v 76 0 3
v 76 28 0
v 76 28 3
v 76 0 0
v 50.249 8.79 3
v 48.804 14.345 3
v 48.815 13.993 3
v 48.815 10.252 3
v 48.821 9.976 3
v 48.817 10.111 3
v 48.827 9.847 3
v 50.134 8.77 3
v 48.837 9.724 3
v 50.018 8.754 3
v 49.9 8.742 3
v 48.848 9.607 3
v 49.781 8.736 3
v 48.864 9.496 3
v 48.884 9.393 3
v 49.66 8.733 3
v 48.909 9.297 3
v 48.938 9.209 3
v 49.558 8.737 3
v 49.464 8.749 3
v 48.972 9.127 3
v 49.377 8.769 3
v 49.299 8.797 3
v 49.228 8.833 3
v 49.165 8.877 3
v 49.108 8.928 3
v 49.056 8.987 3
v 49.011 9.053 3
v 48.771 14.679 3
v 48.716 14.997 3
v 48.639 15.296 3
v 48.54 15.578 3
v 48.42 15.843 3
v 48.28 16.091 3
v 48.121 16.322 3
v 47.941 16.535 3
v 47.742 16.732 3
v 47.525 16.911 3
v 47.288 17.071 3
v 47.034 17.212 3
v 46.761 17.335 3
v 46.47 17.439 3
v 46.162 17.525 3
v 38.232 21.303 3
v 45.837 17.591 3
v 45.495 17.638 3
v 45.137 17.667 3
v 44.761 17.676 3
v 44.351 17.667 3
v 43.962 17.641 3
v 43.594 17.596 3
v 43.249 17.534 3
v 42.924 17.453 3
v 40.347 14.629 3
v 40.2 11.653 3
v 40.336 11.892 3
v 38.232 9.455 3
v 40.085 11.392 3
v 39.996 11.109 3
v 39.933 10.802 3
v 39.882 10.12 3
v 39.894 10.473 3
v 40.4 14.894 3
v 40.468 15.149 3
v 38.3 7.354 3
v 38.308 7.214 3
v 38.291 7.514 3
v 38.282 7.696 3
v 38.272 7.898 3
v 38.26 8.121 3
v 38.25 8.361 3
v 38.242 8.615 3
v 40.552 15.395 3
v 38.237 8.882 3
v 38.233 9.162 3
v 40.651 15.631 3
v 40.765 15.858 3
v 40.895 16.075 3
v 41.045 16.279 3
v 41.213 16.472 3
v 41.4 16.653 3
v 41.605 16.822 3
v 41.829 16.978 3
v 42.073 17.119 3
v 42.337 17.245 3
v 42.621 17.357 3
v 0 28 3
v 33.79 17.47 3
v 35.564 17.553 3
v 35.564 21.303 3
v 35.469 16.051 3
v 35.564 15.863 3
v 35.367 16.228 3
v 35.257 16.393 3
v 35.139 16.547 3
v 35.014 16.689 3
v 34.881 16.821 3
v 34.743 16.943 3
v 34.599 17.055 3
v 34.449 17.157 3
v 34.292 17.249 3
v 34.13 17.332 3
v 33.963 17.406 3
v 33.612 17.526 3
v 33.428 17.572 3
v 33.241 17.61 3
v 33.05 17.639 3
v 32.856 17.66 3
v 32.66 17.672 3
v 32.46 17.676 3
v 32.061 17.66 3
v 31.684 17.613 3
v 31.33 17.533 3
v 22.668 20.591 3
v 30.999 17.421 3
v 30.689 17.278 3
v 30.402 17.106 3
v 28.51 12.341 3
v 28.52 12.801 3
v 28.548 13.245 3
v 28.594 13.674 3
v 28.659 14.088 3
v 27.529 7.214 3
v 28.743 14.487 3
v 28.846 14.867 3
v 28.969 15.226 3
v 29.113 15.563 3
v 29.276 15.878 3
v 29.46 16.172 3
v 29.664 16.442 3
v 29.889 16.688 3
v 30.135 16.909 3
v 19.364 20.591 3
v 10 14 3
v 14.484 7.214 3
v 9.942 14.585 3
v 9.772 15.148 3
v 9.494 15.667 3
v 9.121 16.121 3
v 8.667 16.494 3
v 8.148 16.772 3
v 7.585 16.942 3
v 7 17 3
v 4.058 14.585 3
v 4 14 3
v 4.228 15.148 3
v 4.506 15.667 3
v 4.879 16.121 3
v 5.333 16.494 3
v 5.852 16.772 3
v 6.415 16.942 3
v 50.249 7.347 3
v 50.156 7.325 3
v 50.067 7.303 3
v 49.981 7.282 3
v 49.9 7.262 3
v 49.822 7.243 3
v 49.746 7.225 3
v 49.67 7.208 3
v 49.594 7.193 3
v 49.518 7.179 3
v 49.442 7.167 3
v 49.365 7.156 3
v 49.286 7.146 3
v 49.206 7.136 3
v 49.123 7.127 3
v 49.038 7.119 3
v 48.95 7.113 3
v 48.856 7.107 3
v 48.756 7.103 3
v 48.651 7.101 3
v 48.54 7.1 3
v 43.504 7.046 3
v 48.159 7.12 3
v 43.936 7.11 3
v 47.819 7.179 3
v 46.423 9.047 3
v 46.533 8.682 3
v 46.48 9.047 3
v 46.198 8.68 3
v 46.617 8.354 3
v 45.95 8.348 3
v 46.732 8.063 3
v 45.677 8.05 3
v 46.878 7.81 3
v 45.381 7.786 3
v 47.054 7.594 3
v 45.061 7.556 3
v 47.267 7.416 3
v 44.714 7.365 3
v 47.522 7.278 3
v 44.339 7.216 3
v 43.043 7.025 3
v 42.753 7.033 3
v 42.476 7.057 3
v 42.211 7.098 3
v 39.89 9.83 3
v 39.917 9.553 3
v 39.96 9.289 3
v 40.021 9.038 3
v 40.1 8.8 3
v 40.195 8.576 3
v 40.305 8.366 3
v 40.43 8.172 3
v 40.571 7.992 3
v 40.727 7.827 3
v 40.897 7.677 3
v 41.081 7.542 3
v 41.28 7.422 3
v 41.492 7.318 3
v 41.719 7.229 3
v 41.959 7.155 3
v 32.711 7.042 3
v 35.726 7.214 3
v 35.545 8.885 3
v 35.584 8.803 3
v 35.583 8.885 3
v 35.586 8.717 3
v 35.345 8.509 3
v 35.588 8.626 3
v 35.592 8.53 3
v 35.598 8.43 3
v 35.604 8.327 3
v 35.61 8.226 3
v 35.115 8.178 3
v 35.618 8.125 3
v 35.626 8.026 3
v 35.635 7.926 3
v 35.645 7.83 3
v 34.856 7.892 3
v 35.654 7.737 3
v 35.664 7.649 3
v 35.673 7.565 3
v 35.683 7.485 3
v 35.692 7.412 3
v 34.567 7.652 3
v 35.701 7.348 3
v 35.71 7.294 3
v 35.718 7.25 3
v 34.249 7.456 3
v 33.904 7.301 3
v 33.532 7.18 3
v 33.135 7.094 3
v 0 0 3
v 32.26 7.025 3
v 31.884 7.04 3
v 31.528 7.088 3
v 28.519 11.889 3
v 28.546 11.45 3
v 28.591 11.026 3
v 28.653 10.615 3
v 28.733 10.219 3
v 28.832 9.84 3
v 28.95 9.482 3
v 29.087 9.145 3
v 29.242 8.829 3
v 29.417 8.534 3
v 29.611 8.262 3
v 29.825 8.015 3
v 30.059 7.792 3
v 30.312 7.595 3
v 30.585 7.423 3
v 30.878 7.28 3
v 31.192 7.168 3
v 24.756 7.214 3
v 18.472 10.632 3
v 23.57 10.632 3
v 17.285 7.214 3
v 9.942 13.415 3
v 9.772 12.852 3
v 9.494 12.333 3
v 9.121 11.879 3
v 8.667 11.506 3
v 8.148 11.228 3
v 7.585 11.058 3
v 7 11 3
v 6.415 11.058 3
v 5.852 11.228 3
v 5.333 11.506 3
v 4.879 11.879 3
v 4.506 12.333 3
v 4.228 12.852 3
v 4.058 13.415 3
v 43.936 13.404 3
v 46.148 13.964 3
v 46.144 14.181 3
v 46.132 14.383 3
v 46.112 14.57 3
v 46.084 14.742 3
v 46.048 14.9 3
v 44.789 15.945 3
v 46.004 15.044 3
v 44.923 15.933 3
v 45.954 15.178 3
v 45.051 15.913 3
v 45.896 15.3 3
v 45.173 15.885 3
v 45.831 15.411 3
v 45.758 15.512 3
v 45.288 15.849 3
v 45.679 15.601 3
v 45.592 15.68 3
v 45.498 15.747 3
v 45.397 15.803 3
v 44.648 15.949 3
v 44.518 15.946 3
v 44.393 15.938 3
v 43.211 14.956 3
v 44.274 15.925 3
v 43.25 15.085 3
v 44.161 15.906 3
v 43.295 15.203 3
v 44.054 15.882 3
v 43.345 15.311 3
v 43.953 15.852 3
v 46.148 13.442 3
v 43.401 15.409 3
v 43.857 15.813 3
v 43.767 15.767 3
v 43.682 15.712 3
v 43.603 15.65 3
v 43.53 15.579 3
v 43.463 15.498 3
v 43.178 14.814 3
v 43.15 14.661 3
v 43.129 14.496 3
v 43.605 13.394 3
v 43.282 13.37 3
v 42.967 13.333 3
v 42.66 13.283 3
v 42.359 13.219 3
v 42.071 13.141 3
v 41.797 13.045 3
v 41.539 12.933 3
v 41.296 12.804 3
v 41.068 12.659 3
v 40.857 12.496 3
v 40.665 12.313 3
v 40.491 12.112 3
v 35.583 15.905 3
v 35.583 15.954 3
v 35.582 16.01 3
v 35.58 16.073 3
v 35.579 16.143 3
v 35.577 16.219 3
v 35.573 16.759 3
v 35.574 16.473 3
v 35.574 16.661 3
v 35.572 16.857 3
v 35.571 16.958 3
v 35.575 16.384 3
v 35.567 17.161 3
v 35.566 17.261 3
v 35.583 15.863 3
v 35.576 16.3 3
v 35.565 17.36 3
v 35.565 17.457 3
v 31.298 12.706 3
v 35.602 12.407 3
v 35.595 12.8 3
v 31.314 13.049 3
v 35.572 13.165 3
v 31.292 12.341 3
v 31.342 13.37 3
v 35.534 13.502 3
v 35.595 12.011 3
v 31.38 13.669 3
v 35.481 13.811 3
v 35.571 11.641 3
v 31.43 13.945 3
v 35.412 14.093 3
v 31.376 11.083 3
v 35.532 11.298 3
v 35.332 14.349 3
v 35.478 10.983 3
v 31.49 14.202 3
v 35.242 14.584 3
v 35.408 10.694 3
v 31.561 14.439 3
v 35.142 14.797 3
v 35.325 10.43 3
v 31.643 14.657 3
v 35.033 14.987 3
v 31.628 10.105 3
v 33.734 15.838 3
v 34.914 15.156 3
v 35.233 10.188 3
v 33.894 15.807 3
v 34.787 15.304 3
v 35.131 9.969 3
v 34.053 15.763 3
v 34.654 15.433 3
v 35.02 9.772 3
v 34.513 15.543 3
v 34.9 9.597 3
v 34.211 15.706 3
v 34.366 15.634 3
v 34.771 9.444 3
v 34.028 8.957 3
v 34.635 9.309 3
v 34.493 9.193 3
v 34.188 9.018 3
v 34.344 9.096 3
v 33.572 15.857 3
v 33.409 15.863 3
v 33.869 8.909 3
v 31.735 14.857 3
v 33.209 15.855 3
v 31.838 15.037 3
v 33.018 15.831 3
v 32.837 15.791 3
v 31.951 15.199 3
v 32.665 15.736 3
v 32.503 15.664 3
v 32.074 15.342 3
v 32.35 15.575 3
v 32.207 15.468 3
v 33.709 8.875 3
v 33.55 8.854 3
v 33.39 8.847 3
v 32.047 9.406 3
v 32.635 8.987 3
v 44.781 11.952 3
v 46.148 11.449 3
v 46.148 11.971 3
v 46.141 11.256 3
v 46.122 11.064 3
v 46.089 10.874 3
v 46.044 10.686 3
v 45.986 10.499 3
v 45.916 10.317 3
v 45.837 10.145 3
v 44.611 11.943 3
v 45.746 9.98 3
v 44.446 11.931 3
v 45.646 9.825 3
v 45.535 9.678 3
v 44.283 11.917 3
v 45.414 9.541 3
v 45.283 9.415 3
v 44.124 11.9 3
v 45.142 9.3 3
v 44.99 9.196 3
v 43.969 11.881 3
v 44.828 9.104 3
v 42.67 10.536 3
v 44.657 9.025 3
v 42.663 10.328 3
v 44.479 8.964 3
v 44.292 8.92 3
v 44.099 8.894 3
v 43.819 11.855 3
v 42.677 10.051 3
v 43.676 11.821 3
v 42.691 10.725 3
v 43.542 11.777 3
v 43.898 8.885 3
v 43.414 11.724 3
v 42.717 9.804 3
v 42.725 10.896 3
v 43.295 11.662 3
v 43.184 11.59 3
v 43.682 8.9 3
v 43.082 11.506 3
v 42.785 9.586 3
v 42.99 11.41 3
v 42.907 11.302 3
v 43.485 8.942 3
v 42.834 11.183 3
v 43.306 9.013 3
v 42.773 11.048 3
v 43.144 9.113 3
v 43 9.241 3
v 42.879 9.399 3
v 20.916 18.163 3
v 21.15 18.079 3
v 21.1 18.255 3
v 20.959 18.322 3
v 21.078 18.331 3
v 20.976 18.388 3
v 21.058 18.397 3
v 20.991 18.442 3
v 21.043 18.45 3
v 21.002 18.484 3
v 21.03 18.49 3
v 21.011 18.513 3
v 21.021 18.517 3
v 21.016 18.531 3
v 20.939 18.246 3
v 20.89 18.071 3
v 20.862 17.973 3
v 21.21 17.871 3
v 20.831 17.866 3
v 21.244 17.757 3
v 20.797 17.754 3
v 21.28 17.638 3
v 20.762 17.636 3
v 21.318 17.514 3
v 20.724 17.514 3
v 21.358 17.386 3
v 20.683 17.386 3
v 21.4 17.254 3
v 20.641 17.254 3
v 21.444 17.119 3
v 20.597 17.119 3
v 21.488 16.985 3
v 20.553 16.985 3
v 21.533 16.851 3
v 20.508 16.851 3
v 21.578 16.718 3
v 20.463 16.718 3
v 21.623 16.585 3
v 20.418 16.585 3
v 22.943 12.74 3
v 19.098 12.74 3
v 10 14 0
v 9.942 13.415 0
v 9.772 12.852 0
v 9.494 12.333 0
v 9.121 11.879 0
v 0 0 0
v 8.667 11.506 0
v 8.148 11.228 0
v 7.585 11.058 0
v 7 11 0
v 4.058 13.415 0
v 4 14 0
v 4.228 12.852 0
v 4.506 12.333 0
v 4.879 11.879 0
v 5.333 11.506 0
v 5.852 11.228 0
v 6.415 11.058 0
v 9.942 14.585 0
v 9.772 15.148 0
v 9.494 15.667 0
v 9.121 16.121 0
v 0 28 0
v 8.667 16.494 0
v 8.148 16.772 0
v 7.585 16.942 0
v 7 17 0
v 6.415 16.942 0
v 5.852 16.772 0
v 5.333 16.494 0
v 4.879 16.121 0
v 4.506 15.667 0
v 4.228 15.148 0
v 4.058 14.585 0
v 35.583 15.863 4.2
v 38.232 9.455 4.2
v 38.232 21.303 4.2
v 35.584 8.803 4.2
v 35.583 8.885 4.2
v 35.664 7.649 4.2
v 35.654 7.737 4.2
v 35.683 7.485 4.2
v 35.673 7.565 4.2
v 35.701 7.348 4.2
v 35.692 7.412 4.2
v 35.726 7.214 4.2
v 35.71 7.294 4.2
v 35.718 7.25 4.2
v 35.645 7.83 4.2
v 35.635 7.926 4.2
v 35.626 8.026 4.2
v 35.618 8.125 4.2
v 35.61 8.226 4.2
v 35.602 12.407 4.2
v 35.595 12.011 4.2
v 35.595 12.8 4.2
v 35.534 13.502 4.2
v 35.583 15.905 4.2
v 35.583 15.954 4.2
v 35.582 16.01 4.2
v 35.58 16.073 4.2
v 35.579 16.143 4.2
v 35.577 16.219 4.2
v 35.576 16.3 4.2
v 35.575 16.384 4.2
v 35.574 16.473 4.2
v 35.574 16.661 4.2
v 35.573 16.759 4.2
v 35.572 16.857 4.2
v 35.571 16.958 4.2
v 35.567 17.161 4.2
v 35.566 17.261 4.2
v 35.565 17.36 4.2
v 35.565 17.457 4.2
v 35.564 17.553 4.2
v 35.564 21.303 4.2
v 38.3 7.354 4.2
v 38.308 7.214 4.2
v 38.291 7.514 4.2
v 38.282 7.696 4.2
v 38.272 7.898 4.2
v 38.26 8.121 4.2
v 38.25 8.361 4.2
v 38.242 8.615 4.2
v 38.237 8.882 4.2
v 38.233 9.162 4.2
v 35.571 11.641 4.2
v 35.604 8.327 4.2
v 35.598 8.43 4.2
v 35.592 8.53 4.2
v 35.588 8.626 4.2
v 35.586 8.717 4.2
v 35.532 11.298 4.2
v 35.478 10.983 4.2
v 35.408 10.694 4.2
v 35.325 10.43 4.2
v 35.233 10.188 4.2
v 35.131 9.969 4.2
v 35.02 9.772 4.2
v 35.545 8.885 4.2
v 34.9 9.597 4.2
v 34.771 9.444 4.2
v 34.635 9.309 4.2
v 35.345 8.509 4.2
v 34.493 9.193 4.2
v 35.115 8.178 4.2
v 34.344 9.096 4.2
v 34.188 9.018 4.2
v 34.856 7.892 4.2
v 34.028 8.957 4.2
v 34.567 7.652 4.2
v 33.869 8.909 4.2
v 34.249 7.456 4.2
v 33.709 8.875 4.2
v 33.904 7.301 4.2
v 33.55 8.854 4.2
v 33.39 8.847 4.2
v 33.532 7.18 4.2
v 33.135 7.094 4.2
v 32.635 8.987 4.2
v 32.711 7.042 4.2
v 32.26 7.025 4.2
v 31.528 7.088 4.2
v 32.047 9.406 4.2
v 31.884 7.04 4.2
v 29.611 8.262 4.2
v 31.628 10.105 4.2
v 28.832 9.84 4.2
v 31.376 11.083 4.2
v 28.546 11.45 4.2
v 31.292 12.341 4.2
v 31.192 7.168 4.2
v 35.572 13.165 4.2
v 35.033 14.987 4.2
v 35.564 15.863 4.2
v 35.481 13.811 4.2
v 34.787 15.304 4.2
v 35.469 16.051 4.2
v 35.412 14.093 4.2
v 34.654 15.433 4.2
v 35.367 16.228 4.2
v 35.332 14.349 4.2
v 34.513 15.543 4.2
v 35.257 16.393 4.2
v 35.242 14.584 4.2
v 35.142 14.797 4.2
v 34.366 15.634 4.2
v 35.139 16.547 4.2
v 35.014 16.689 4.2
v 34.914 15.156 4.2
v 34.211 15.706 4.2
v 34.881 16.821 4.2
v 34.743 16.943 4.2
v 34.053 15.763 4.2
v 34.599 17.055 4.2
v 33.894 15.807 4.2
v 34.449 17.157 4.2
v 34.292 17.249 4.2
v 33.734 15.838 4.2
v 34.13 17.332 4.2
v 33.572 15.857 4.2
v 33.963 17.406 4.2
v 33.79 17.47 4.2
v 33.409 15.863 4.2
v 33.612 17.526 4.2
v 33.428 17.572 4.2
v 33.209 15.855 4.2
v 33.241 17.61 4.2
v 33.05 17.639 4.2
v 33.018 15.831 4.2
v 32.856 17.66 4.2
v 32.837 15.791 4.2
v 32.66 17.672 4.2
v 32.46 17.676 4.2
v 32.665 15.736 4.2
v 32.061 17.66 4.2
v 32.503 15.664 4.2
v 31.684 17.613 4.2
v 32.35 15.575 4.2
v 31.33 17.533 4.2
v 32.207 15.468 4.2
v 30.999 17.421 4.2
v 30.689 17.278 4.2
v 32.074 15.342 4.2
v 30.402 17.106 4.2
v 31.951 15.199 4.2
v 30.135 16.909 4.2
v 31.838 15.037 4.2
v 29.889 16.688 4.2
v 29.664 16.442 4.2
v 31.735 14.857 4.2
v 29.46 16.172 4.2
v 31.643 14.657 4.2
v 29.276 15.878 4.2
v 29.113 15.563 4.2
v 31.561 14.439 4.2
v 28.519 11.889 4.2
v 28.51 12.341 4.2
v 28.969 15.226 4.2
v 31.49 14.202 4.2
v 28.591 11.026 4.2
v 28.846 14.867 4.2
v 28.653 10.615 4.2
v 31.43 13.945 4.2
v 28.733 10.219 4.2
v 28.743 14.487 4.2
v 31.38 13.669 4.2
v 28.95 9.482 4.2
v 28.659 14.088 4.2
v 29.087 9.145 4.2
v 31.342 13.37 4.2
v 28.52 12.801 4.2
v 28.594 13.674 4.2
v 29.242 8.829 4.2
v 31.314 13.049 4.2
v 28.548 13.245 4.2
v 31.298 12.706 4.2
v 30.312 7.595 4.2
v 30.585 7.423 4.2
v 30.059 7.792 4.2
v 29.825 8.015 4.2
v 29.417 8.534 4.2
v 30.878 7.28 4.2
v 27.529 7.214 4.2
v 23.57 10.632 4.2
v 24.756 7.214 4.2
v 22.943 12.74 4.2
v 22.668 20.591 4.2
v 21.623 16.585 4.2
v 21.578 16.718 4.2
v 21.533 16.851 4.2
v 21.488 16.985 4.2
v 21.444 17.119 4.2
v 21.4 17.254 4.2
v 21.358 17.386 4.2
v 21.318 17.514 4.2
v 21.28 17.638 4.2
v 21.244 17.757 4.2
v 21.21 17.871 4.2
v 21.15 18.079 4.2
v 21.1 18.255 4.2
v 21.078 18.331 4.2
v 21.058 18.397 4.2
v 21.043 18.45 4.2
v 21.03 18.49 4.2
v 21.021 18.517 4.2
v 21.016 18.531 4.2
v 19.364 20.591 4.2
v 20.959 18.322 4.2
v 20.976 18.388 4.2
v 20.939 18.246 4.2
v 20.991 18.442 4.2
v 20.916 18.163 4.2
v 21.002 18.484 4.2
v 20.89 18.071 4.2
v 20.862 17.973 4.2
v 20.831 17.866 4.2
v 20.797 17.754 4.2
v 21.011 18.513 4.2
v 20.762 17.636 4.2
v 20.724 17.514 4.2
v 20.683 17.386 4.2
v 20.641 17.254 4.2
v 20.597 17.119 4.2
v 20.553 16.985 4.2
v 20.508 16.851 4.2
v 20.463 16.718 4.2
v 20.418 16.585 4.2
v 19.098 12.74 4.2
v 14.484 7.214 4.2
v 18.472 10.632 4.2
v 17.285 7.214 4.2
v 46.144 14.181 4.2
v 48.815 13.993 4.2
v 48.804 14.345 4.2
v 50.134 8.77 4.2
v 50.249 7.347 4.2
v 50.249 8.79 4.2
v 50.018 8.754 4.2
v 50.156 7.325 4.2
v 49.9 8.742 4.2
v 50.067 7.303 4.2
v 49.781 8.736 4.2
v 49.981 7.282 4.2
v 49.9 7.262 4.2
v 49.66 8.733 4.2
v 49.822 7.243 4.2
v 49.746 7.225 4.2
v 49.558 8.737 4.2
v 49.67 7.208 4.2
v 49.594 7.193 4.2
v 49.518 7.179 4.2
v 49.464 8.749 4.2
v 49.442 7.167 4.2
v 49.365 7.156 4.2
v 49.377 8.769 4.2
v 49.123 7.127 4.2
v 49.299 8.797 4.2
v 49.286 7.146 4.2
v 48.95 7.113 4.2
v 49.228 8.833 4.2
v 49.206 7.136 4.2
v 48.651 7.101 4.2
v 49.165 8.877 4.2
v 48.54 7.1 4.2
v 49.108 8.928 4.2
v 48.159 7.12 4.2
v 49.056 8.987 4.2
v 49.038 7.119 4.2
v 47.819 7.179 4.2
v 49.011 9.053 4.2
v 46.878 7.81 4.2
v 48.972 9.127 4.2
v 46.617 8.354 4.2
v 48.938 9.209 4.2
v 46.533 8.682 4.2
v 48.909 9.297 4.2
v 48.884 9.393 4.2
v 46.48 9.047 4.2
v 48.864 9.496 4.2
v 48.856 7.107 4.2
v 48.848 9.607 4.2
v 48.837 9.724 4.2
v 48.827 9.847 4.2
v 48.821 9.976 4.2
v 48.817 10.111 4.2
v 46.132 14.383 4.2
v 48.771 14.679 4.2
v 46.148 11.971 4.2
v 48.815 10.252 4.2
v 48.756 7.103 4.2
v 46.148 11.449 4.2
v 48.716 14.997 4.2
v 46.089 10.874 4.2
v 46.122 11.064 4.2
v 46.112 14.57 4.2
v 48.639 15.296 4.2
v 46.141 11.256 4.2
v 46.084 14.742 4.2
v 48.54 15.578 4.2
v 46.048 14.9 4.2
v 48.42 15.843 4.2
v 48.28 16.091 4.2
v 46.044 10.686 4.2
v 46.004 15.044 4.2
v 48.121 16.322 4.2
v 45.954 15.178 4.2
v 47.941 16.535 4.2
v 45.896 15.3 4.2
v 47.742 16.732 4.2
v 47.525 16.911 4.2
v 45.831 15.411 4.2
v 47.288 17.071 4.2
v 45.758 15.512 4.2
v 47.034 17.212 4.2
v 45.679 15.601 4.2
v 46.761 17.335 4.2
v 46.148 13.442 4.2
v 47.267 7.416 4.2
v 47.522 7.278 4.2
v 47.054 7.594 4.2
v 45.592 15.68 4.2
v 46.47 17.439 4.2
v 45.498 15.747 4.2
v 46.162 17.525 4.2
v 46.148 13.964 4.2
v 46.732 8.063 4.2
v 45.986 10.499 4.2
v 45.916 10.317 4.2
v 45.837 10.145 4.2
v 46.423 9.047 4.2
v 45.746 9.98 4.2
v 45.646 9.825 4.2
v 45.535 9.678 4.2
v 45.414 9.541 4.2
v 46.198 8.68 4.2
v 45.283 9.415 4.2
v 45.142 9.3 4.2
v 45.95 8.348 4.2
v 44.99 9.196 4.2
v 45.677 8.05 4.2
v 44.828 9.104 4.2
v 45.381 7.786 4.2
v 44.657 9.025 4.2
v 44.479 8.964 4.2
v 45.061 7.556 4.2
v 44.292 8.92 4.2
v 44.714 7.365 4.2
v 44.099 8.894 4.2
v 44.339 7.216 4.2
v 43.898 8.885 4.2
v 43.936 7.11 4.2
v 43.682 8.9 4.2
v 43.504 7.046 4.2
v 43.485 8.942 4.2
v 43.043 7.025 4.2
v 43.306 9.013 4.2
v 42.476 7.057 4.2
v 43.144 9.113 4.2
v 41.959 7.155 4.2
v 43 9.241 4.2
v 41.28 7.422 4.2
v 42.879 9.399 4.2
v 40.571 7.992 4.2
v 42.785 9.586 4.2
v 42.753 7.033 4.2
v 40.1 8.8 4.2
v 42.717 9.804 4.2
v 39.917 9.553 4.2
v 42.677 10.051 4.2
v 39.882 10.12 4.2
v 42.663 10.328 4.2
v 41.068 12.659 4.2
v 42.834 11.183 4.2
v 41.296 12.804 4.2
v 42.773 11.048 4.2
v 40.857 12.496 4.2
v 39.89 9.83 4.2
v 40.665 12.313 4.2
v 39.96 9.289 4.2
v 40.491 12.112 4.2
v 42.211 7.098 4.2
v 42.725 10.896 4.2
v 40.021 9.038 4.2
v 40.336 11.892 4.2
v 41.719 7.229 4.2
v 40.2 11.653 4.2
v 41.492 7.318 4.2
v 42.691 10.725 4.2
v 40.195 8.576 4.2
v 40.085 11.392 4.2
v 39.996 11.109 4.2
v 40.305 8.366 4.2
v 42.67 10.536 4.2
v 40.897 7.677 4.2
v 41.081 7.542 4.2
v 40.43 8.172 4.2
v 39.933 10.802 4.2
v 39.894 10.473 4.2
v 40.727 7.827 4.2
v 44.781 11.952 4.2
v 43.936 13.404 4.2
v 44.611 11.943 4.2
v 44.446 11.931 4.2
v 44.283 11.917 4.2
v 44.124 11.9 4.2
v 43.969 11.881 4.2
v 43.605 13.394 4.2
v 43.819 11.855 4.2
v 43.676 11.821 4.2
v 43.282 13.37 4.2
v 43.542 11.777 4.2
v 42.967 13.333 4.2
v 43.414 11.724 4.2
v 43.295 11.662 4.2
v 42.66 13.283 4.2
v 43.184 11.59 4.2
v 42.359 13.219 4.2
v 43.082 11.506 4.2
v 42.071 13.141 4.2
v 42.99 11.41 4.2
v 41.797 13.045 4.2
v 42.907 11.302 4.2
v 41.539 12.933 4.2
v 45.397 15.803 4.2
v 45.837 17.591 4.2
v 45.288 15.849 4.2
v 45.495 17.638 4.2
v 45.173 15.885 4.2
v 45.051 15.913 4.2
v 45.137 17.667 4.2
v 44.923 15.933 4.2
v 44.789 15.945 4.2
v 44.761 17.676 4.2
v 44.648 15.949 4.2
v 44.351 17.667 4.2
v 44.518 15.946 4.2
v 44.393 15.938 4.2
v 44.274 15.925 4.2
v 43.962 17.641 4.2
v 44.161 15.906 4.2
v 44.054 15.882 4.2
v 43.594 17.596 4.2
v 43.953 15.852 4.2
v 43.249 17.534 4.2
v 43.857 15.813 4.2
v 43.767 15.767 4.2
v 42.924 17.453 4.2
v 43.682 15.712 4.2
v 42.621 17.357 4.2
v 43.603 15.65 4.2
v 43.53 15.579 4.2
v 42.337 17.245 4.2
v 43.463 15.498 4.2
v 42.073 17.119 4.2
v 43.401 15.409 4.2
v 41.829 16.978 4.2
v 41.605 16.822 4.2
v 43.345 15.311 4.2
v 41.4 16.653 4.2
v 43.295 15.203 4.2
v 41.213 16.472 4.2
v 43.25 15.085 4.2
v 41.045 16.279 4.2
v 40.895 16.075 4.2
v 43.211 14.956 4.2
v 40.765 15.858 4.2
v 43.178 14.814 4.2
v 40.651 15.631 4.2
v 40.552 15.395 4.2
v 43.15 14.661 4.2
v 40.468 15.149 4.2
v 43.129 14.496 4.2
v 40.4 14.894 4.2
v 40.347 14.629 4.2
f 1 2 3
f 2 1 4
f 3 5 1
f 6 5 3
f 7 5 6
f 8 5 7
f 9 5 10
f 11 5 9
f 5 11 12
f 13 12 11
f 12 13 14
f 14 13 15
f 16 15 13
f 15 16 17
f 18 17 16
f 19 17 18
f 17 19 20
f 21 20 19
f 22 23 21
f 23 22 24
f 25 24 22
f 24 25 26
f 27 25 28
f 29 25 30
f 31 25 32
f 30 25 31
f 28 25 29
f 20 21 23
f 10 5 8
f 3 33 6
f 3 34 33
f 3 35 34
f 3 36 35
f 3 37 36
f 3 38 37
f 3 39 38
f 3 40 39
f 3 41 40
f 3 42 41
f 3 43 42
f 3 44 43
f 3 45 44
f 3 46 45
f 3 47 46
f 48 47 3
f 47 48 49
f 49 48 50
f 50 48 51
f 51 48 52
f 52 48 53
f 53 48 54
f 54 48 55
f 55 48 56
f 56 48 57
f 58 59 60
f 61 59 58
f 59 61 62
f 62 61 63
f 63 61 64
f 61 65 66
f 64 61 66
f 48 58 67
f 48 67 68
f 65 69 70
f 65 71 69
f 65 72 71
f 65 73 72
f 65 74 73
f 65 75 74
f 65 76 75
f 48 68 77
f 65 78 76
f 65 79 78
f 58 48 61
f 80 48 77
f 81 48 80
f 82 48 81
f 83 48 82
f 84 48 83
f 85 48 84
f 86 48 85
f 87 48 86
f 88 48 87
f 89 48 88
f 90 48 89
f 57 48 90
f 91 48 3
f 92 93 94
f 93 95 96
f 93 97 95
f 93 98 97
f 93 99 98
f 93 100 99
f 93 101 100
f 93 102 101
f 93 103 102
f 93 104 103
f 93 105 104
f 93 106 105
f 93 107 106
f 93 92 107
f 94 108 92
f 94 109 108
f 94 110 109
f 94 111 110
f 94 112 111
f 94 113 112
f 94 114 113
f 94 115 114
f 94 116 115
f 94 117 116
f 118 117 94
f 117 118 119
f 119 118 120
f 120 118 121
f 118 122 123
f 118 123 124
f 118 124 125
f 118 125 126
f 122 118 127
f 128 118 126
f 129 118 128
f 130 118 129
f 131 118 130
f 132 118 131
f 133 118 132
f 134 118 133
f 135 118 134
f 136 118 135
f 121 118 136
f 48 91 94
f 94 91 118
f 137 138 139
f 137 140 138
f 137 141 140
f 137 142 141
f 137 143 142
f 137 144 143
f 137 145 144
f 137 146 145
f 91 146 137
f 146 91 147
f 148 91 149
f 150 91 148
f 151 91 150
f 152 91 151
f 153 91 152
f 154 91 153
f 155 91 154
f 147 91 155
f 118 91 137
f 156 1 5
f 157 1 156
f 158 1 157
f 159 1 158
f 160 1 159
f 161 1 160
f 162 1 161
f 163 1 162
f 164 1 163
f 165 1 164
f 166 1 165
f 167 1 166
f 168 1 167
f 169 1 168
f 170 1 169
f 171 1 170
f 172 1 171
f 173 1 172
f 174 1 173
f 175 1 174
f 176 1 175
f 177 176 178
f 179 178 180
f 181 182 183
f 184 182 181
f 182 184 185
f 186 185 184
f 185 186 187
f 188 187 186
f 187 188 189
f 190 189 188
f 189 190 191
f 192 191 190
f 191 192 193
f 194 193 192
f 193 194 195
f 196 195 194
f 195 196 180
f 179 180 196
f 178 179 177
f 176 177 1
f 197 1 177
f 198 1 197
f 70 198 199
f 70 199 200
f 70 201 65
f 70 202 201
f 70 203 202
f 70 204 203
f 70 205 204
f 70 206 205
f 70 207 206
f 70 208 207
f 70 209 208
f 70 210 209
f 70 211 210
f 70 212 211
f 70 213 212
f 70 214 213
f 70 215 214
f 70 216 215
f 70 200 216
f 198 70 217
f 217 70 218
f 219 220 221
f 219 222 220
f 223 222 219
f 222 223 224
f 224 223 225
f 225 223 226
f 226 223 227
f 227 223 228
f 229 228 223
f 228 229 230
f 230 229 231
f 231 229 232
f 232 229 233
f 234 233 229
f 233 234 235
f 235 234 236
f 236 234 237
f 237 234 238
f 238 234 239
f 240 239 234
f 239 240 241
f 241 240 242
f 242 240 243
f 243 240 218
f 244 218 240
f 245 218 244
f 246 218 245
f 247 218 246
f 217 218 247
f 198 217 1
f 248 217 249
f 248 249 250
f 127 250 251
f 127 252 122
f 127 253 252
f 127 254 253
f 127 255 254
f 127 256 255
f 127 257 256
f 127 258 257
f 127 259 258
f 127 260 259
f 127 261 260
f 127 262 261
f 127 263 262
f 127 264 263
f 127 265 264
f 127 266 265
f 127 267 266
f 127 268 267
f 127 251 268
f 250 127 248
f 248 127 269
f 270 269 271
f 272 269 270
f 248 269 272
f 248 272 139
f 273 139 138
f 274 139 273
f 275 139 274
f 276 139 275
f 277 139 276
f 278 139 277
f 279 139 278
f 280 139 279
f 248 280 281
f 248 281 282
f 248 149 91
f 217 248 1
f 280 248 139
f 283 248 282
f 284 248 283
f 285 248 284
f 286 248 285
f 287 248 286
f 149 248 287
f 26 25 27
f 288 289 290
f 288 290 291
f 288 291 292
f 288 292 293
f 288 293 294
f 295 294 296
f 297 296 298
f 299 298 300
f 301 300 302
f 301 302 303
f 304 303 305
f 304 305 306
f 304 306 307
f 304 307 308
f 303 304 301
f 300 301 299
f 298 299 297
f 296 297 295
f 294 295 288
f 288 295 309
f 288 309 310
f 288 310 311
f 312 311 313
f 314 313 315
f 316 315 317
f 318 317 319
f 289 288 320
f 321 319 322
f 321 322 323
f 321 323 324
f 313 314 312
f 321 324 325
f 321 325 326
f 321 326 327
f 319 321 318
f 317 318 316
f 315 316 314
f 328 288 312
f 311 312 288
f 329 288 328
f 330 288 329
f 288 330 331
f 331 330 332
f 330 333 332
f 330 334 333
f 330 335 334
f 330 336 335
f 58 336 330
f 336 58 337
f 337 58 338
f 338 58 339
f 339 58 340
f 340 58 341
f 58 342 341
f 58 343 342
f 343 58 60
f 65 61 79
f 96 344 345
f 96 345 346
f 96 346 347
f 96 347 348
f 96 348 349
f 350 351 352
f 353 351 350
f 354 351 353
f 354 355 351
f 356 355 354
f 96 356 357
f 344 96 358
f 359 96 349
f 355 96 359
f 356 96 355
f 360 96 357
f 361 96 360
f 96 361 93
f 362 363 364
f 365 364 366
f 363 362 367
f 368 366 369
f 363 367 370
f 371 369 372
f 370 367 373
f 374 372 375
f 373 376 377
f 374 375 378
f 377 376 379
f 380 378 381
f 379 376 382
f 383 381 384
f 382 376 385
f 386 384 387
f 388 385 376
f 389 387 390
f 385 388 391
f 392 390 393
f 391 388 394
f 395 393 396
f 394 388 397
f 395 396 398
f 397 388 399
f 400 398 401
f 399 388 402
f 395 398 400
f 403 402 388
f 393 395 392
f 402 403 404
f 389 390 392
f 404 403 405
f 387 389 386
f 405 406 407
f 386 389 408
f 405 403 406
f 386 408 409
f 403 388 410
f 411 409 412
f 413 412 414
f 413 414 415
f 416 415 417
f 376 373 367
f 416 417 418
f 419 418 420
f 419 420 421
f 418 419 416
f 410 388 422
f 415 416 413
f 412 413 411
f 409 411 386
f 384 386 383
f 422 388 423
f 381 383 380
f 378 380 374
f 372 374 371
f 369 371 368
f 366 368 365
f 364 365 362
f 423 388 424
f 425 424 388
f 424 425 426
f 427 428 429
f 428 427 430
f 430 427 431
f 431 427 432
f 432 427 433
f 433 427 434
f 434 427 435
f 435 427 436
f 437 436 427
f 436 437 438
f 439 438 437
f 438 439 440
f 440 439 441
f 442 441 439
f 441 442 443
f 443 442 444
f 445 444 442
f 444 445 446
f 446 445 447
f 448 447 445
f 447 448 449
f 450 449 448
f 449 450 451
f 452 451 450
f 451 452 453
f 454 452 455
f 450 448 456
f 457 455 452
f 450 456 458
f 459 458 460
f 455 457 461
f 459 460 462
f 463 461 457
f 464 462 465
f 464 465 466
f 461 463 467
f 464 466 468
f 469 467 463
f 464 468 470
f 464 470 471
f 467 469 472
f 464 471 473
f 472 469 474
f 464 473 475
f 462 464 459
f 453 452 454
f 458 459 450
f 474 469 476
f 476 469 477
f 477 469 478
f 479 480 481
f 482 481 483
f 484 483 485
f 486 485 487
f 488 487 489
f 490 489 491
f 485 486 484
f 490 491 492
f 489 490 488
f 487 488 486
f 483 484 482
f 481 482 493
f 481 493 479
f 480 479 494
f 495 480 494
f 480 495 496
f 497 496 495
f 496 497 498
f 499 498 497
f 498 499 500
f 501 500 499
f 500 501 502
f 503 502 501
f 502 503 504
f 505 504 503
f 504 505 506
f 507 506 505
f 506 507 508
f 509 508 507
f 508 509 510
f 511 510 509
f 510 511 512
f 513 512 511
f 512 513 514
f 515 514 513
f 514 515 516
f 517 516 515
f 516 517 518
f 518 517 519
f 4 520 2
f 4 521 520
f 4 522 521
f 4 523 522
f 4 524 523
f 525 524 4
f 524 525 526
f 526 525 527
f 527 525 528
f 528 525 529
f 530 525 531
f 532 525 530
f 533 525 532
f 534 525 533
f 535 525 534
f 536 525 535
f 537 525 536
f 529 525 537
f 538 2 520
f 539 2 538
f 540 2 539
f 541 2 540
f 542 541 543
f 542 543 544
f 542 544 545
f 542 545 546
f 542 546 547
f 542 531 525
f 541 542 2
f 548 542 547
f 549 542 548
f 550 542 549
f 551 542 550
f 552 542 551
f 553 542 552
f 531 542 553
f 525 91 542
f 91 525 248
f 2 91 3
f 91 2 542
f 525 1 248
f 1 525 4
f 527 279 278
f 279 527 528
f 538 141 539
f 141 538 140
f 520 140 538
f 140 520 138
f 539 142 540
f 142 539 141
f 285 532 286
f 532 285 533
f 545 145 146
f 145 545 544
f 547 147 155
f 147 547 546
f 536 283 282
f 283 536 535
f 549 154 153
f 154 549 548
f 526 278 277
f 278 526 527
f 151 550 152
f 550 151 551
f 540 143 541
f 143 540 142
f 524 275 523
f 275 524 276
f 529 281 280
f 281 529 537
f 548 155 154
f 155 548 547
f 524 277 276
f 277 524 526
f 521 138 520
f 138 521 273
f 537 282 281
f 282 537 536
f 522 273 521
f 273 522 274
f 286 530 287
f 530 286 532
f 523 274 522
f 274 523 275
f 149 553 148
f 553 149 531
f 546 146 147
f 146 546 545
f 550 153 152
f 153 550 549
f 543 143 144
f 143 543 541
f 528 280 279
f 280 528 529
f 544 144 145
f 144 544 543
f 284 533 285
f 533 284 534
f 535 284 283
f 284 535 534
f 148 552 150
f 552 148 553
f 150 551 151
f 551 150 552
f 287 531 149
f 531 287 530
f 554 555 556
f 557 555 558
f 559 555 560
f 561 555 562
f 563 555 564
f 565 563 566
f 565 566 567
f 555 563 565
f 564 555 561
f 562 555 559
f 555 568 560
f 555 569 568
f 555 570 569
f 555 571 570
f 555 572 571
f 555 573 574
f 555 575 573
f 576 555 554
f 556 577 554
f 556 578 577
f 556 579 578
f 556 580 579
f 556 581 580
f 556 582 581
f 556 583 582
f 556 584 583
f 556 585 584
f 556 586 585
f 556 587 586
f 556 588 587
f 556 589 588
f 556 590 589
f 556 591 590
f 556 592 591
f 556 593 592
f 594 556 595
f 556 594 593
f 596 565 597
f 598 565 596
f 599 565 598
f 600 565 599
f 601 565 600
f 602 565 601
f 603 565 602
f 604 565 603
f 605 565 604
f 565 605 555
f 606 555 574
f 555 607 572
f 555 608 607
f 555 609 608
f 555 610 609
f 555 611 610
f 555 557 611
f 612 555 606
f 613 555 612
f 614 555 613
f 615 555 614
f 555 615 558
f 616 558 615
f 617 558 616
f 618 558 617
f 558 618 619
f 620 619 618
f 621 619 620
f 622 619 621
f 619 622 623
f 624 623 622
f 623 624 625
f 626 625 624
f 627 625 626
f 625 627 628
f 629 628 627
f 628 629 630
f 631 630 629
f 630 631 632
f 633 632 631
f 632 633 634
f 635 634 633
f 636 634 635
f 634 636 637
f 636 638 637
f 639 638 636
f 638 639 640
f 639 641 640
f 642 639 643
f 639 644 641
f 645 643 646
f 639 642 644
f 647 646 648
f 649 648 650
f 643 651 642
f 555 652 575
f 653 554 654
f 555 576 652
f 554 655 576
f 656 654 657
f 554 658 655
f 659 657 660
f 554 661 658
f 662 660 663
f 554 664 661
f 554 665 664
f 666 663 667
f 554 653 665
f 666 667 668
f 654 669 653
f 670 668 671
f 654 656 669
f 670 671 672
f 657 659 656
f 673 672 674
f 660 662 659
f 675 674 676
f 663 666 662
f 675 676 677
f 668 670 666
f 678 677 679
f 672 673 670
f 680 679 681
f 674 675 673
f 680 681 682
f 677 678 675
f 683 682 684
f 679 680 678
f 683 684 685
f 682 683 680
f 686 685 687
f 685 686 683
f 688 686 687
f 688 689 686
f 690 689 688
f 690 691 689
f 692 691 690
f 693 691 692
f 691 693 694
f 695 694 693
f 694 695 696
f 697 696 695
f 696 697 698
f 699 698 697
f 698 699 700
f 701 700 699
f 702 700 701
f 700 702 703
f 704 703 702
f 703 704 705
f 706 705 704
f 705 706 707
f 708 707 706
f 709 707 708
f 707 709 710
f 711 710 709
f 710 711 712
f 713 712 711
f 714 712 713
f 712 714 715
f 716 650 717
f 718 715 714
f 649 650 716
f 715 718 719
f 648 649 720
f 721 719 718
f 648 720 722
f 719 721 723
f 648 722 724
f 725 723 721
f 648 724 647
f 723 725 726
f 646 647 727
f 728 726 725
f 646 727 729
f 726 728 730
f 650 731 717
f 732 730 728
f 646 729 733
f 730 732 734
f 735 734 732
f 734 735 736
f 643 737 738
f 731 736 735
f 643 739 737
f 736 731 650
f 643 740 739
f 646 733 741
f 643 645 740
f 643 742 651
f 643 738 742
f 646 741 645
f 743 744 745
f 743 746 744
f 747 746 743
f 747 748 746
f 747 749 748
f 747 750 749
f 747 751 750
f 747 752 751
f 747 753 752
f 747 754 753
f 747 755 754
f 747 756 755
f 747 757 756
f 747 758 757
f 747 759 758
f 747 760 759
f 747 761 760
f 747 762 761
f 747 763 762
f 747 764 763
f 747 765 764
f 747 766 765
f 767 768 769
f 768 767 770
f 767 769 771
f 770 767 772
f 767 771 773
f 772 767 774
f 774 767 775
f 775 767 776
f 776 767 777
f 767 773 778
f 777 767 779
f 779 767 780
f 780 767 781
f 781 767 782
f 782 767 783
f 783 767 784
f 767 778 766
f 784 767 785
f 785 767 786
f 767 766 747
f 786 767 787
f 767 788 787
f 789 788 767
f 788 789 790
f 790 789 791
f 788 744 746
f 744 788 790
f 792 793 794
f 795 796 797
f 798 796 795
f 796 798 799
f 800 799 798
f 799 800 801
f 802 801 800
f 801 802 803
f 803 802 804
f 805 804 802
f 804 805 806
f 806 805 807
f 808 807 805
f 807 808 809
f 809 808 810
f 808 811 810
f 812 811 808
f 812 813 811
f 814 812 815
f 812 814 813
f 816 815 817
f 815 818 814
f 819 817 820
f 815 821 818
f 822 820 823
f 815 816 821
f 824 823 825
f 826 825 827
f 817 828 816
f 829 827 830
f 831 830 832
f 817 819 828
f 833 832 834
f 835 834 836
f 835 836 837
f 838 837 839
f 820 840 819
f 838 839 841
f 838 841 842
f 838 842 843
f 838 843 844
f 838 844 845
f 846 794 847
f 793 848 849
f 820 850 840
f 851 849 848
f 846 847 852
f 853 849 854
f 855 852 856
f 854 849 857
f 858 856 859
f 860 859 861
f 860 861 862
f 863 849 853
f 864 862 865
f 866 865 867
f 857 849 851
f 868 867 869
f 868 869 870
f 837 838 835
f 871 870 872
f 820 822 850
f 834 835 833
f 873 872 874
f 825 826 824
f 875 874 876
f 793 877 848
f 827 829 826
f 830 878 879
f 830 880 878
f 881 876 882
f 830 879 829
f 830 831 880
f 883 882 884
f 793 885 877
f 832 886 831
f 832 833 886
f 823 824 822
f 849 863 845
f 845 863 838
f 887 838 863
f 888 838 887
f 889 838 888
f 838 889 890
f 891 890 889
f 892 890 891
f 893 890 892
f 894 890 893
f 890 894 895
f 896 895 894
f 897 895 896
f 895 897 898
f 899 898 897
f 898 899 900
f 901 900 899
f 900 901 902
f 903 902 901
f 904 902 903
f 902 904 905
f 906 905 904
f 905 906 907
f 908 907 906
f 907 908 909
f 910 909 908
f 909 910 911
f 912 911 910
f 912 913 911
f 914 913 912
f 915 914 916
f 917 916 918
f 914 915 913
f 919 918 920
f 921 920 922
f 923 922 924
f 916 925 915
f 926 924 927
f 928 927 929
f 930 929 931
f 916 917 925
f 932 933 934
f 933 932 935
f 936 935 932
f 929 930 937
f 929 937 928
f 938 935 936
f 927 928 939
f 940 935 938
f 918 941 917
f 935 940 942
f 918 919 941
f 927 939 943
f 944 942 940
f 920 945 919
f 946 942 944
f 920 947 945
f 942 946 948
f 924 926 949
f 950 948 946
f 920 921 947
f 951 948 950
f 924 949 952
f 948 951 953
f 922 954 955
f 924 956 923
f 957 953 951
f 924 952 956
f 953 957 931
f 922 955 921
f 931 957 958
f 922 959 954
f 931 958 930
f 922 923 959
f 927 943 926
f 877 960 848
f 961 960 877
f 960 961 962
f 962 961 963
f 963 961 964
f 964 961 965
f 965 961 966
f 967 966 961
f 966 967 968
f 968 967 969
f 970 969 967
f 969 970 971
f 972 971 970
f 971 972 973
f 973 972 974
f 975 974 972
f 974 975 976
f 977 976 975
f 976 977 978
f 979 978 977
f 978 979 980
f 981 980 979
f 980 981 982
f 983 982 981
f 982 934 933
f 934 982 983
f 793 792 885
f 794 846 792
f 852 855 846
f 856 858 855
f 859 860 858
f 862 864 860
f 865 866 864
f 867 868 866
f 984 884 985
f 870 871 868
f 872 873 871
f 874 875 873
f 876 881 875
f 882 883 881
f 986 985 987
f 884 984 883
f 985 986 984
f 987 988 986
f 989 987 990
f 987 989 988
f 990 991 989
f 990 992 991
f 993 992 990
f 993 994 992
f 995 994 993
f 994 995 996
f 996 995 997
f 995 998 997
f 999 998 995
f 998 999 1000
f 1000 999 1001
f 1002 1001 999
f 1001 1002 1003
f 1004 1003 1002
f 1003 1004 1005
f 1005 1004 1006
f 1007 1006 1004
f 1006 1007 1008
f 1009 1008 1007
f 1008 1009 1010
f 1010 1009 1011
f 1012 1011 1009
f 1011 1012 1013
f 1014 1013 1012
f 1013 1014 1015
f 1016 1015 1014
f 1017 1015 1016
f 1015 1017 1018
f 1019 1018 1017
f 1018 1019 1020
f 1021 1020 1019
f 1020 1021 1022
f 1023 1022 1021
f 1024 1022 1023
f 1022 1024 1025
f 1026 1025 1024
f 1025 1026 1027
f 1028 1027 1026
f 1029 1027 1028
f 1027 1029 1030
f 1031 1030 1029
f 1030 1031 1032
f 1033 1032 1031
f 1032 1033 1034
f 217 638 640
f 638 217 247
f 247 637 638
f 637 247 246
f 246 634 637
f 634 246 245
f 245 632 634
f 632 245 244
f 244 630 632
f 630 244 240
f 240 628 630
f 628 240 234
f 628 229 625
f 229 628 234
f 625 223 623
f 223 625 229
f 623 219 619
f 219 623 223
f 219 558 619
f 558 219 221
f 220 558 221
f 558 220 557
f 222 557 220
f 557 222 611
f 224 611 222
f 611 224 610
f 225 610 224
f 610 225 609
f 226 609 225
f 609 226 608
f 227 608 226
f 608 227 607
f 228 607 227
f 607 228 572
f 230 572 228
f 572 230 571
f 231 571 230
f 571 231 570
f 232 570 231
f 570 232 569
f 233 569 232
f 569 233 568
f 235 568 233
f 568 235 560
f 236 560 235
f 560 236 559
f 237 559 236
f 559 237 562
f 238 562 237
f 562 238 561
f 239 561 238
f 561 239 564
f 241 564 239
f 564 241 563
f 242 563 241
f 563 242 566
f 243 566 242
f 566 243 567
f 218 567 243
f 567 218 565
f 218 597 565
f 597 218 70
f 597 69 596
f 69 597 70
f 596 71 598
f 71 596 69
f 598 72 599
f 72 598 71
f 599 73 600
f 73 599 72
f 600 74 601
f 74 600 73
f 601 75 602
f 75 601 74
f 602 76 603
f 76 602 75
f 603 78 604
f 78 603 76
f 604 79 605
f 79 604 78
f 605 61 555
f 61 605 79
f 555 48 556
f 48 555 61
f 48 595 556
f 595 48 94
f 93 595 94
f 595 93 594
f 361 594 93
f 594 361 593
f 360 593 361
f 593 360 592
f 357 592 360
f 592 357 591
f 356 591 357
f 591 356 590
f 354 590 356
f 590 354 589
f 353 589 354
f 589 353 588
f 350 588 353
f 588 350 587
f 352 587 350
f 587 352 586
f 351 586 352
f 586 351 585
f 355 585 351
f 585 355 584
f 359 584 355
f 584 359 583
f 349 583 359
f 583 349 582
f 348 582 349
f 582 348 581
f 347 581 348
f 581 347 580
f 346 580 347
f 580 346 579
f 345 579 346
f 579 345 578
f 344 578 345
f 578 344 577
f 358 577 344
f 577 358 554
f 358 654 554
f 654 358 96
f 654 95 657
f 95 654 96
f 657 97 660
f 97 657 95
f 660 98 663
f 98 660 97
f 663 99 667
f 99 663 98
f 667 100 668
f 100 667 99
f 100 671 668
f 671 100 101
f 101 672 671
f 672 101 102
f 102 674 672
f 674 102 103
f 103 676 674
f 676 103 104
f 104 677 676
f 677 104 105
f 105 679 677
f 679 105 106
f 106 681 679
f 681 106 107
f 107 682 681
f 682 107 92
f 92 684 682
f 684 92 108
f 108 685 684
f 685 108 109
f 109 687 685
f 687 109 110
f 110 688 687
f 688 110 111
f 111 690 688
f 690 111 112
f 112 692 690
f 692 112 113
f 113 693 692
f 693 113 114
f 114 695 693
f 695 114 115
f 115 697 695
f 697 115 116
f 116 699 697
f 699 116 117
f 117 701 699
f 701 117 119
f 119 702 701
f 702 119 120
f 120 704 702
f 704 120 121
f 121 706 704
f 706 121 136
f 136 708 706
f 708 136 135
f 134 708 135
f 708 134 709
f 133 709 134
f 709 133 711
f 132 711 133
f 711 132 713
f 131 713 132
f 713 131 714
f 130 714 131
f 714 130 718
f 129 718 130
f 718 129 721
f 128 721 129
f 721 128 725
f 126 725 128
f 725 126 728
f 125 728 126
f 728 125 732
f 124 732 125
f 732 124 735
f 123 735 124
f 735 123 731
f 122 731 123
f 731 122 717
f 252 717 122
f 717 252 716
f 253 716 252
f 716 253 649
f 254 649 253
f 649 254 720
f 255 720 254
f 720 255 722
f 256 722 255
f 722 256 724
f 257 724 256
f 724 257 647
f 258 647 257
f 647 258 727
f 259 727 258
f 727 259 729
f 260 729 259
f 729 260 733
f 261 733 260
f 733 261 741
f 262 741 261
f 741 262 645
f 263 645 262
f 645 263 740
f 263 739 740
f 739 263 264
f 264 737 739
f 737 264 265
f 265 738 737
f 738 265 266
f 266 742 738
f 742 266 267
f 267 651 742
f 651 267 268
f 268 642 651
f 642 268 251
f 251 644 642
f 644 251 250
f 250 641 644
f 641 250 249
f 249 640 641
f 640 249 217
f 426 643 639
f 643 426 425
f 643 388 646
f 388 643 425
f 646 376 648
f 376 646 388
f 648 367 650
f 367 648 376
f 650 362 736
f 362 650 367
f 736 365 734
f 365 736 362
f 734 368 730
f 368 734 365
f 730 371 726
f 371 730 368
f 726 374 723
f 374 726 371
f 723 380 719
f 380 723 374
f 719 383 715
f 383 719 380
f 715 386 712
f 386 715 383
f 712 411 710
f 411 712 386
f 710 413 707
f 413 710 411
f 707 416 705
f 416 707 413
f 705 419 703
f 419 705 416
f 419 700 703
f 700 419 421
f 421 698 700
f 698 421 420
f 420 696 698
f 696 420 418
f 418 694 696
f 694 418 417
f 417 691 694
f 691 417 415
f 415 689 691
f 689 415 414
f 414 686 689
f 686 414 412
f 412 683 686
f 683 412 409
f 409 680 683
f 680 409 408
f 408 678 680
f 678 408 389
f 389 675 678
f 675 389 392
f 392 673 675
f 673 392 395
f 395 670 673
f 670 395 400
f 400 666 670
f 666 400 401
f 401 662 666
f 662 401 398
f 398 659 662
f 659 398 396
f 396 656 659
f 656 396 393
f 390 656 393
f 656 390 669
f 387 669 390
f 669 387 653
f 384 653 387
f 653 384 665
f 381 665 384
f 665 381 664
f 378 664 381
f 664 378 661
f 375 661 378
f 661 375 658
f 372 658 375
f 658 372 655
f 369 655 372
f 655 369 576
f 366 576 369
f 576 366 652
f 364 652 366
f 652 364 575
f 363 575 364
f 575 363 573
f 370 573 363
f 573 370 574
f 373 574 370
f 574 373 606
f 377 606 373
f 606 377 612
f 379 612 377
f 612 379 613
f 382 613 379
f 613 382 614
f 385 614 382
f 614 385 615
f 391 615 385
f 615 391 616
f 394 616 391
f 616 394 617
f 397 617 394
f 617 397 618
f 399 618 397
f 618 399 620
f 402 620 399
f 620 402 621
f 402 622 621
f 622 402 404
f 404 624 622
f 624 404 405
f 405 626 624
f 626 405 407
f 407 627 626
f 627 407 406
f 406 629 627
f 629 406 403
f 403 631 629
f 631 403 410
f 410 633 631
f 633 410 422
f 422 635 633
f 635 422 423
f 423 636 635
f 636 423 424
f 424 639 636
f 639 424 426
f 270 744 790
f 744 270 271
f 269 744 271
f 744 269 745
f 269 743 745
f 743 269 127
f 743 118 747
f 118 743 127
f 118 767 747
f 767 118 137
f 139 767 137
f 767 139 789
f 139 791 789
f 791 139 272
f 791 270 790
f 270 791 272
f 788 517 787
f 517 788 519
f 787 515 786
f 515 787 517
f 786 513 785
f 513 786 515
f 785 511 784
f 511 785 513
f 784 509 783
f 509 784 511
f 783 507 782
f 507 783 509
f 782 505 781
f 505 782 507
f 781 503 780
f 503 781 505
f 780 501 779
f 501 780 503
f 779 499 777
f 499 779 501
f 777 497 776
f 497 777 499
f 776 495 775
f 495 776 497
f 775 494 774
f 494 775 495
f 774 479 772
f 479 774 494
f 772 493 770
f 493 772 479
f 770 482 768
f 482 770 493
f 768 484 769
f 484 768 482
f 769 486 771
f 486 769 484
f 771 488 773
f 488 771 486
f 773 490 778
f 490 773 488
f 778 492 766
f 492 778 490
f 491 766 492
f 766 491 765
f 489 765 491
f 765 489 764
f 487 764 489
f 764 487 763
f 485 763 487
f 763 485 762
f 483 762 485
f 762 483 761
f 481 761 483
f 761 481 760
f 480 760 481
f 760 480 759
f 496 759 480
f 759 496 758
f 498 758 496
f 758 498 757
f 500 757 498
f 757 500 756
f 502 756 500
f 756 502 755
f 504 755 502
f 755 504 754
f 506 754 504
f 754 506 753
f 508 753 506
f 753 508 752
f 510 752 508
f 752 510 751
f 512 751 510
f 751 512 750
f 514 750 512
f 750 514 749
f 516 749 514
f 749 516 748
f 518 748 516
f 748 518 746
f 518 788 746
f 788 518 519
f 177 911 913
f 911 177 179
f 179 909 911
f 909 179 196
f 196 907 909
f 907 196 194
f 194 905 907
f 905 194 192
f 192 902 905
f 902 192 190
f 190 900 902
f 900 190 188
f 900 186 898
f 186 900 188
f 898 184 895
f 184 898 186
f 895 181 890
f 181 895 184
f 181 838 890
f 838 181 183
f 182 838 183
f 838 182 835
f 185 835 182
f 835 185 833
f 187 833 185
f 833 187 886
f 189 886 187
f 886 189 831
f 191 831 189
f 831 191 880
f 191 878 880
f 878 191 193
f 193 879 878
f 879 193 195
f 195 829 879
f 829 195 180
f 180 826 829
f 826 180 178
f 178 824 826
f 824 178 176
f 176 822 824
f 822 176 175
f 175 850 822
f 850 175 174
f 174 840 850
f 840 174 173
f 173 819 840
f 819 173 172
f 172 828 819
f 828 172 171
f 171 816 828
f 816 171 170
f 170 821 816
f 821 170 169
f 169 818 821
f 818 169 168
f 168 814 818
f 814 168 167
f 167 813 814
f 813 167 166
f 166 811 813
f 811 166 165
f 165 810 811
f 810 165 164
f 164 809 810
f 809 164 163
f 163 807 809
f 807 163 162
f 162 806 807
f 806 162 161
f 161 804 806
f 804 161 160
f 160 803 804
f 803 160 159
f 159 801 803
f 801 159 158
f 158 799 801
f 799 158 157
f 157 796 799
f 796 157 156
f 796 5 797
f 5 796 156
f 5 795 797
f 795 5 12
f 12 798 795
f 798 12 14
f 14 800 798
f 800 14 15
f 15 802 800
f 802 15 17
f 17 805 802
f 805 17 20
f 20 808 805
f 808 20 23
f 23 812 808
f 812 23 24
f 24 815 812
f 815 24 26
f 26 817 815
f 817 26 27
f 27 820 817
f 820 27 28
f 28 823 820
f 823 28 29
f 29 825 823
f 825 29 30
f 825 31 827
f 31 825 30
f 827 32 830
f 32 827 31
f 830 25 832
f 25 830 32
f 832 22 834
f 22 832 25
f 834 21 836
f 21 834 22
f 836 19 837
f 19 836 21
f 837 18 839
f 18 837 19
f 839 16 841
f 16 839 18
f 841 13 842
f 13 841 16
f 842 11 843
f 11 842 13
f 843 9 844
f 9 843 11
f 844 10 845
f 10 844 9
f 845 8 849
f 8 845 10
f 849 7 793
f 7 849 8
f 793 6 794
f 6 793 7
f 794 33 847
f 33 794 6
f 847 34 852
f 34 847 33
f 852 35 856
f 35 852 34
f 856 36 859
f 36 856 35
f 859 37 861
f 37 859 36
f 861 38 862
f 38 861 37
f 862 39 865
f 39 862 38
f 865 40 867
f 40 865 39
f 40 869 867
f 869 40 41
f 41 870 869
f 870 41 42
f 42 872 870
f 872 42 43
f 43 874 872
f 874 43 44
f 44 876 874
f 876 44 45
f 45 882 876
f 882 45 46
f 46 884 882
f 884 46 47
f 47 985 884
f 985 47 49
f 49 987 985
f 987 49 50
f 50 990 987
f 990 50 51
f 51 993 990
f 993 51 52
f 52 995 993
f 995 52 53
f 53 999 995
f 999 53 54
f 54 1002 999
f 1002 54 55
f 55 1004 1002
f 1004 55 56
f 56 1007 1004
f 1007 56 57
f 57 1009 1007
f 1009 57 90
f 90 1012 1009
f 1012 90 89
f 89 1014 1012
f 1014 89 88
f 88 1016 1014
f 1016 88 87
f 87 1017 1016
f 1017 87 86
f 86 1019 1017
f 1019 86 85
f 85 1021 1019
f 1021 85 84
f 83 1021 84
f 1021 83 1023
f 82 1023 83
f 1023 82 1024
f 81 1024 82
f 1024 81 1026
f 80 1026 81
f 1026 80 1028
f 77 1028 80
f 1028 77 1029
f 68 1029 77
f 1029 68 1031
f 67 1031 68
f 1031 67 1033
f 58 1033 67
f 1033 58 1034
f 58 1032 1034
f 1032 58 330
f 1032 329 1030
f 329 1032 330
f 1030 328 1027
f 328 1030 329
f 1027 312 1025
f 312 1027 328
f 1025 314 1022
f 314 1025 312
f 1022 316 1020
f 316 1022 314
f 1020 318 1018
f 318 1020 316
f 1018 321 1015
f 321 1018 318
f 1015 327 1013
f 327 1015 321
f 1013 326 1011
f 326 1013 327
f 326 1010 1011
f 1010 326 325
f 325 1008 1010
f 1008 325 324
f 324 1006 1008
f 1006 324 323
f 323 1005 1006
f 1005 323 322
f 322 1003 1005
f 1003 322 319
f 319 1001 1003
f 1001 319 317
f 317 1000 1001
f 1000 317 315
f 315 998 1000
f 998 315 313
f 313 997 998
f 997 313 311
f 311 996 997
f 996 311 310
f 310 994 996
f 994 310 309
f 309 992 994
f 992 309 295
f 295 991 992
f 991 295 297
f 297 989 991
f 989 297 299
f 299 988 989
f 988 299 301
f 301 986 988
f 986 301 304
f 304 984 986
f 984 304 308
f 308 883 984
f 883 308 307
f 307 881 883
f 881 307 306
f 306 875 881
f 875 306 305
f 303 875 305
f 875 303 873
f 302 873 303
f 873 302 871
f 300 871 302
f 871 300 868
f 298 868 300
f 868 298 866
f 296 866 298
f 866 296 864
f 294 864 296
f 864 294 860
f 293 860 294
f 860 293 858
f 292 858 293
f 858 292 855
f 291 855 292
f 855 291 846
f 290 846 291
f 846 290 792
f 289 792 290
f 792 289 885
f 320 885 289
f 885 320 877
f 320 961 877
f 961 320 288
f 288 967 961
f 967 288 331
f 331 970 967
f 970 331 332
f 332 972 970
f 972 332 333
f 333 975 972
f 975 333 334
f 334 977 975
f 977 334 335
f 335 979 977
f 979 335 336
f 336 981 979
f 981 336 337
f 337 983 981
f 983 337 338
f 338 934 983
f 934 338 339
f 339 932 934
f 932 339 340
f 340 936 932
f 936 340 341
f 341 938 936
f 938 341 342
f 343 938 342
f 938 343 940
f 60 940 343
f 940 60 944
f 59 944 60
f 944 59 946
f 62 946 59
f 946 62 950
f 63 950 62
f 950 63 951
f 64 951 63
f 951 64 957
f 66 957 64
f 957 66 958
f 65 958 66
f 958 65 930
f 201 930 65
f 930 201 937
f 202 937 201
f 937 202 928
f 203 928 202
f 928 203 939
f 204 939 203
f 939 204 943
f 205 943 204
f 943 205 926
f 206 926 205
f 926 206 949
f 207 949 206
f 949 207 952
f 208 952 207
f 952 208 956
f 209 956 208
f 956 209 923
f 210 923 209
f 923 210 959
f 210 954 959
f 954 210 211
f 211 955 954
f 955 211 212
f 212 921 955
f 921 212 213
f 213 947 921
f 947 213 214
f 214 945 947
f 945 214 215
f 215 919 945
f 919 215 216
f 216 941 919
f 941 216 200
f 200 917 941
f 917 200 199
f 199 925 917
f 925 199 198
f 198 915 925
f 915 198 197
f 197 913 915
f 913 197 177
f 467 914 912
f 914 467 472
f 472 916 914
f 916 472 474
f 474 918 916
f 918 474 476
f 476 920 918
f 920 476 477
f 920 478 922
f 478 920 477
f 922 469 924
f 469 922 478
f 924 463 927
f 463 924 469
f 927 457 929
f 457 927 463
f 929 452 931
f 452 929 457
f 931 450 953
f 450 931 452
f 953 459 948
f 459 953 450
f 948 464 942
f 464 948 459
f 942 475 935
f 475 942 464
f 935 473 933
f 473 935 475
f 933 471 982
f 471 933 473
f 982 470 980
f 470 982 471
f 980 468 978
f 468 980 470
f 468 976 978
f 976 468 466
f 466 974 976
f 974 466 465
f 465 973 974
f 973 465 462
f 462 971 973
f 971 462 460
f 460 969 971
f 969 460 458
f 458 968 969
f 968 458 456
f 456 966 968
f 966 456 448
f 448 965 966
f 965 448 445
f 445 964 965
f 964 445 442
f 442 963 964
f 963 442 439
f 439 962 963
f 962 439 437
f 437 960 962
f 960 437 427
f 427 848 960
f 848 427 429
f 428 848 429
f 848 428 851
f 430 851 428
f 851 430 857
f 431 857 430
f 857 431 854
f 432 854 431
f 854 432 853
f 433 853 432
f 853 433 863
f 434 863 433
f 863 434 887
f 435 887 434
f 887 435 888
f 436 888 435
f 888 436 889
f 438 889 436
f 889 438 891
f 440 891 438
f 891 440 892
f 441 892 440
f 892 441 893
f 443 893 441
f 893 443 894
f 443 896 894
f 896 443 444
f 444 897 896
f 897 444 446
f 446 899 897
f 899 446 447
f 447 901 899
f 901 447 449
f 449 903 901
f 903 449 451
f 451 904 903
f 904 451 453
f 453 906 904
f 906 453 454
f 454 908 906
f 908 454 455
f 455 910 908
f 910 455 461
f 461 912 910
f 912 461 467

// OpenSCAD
// name-tag.scad — a luggage or toolbox tag with the name
// standing proud of the face. text() makes flat lettering;
// linear_extrude() gives it height. The name is a variable
// because names change: chapter 9 replaces it with -D.

/* [Tag] */
// The words on the tag
name = "Ada";
// Letter height in millimetres
letter_size = 14;    // [8:24]

/* [Hidden] */
$fn = 32;
tag_w = 76;
tag_d = 28;
tag_t = 3;      // tag thickness
letter_h = 1.2; // how far the letters stand proud

union() {
    // The tag itself, with a hanging hole cut at one end.
    difference() {
        cube([tag_w, tag_d, tag_t]);
        translate([7, tag_d / 2, -1])
            cylinder(h = tag_t + 2, r = 3);
    }
    // The letters, lying flat on the tag's face.
    translate([14, tag_d / 2, tag_t])
        linear_extrude(height = letter_h)
            text(name, size = letter_size,
                 font = "Liberation Sans:style=Bold",
                 halign = "left", valign = "center");
}
